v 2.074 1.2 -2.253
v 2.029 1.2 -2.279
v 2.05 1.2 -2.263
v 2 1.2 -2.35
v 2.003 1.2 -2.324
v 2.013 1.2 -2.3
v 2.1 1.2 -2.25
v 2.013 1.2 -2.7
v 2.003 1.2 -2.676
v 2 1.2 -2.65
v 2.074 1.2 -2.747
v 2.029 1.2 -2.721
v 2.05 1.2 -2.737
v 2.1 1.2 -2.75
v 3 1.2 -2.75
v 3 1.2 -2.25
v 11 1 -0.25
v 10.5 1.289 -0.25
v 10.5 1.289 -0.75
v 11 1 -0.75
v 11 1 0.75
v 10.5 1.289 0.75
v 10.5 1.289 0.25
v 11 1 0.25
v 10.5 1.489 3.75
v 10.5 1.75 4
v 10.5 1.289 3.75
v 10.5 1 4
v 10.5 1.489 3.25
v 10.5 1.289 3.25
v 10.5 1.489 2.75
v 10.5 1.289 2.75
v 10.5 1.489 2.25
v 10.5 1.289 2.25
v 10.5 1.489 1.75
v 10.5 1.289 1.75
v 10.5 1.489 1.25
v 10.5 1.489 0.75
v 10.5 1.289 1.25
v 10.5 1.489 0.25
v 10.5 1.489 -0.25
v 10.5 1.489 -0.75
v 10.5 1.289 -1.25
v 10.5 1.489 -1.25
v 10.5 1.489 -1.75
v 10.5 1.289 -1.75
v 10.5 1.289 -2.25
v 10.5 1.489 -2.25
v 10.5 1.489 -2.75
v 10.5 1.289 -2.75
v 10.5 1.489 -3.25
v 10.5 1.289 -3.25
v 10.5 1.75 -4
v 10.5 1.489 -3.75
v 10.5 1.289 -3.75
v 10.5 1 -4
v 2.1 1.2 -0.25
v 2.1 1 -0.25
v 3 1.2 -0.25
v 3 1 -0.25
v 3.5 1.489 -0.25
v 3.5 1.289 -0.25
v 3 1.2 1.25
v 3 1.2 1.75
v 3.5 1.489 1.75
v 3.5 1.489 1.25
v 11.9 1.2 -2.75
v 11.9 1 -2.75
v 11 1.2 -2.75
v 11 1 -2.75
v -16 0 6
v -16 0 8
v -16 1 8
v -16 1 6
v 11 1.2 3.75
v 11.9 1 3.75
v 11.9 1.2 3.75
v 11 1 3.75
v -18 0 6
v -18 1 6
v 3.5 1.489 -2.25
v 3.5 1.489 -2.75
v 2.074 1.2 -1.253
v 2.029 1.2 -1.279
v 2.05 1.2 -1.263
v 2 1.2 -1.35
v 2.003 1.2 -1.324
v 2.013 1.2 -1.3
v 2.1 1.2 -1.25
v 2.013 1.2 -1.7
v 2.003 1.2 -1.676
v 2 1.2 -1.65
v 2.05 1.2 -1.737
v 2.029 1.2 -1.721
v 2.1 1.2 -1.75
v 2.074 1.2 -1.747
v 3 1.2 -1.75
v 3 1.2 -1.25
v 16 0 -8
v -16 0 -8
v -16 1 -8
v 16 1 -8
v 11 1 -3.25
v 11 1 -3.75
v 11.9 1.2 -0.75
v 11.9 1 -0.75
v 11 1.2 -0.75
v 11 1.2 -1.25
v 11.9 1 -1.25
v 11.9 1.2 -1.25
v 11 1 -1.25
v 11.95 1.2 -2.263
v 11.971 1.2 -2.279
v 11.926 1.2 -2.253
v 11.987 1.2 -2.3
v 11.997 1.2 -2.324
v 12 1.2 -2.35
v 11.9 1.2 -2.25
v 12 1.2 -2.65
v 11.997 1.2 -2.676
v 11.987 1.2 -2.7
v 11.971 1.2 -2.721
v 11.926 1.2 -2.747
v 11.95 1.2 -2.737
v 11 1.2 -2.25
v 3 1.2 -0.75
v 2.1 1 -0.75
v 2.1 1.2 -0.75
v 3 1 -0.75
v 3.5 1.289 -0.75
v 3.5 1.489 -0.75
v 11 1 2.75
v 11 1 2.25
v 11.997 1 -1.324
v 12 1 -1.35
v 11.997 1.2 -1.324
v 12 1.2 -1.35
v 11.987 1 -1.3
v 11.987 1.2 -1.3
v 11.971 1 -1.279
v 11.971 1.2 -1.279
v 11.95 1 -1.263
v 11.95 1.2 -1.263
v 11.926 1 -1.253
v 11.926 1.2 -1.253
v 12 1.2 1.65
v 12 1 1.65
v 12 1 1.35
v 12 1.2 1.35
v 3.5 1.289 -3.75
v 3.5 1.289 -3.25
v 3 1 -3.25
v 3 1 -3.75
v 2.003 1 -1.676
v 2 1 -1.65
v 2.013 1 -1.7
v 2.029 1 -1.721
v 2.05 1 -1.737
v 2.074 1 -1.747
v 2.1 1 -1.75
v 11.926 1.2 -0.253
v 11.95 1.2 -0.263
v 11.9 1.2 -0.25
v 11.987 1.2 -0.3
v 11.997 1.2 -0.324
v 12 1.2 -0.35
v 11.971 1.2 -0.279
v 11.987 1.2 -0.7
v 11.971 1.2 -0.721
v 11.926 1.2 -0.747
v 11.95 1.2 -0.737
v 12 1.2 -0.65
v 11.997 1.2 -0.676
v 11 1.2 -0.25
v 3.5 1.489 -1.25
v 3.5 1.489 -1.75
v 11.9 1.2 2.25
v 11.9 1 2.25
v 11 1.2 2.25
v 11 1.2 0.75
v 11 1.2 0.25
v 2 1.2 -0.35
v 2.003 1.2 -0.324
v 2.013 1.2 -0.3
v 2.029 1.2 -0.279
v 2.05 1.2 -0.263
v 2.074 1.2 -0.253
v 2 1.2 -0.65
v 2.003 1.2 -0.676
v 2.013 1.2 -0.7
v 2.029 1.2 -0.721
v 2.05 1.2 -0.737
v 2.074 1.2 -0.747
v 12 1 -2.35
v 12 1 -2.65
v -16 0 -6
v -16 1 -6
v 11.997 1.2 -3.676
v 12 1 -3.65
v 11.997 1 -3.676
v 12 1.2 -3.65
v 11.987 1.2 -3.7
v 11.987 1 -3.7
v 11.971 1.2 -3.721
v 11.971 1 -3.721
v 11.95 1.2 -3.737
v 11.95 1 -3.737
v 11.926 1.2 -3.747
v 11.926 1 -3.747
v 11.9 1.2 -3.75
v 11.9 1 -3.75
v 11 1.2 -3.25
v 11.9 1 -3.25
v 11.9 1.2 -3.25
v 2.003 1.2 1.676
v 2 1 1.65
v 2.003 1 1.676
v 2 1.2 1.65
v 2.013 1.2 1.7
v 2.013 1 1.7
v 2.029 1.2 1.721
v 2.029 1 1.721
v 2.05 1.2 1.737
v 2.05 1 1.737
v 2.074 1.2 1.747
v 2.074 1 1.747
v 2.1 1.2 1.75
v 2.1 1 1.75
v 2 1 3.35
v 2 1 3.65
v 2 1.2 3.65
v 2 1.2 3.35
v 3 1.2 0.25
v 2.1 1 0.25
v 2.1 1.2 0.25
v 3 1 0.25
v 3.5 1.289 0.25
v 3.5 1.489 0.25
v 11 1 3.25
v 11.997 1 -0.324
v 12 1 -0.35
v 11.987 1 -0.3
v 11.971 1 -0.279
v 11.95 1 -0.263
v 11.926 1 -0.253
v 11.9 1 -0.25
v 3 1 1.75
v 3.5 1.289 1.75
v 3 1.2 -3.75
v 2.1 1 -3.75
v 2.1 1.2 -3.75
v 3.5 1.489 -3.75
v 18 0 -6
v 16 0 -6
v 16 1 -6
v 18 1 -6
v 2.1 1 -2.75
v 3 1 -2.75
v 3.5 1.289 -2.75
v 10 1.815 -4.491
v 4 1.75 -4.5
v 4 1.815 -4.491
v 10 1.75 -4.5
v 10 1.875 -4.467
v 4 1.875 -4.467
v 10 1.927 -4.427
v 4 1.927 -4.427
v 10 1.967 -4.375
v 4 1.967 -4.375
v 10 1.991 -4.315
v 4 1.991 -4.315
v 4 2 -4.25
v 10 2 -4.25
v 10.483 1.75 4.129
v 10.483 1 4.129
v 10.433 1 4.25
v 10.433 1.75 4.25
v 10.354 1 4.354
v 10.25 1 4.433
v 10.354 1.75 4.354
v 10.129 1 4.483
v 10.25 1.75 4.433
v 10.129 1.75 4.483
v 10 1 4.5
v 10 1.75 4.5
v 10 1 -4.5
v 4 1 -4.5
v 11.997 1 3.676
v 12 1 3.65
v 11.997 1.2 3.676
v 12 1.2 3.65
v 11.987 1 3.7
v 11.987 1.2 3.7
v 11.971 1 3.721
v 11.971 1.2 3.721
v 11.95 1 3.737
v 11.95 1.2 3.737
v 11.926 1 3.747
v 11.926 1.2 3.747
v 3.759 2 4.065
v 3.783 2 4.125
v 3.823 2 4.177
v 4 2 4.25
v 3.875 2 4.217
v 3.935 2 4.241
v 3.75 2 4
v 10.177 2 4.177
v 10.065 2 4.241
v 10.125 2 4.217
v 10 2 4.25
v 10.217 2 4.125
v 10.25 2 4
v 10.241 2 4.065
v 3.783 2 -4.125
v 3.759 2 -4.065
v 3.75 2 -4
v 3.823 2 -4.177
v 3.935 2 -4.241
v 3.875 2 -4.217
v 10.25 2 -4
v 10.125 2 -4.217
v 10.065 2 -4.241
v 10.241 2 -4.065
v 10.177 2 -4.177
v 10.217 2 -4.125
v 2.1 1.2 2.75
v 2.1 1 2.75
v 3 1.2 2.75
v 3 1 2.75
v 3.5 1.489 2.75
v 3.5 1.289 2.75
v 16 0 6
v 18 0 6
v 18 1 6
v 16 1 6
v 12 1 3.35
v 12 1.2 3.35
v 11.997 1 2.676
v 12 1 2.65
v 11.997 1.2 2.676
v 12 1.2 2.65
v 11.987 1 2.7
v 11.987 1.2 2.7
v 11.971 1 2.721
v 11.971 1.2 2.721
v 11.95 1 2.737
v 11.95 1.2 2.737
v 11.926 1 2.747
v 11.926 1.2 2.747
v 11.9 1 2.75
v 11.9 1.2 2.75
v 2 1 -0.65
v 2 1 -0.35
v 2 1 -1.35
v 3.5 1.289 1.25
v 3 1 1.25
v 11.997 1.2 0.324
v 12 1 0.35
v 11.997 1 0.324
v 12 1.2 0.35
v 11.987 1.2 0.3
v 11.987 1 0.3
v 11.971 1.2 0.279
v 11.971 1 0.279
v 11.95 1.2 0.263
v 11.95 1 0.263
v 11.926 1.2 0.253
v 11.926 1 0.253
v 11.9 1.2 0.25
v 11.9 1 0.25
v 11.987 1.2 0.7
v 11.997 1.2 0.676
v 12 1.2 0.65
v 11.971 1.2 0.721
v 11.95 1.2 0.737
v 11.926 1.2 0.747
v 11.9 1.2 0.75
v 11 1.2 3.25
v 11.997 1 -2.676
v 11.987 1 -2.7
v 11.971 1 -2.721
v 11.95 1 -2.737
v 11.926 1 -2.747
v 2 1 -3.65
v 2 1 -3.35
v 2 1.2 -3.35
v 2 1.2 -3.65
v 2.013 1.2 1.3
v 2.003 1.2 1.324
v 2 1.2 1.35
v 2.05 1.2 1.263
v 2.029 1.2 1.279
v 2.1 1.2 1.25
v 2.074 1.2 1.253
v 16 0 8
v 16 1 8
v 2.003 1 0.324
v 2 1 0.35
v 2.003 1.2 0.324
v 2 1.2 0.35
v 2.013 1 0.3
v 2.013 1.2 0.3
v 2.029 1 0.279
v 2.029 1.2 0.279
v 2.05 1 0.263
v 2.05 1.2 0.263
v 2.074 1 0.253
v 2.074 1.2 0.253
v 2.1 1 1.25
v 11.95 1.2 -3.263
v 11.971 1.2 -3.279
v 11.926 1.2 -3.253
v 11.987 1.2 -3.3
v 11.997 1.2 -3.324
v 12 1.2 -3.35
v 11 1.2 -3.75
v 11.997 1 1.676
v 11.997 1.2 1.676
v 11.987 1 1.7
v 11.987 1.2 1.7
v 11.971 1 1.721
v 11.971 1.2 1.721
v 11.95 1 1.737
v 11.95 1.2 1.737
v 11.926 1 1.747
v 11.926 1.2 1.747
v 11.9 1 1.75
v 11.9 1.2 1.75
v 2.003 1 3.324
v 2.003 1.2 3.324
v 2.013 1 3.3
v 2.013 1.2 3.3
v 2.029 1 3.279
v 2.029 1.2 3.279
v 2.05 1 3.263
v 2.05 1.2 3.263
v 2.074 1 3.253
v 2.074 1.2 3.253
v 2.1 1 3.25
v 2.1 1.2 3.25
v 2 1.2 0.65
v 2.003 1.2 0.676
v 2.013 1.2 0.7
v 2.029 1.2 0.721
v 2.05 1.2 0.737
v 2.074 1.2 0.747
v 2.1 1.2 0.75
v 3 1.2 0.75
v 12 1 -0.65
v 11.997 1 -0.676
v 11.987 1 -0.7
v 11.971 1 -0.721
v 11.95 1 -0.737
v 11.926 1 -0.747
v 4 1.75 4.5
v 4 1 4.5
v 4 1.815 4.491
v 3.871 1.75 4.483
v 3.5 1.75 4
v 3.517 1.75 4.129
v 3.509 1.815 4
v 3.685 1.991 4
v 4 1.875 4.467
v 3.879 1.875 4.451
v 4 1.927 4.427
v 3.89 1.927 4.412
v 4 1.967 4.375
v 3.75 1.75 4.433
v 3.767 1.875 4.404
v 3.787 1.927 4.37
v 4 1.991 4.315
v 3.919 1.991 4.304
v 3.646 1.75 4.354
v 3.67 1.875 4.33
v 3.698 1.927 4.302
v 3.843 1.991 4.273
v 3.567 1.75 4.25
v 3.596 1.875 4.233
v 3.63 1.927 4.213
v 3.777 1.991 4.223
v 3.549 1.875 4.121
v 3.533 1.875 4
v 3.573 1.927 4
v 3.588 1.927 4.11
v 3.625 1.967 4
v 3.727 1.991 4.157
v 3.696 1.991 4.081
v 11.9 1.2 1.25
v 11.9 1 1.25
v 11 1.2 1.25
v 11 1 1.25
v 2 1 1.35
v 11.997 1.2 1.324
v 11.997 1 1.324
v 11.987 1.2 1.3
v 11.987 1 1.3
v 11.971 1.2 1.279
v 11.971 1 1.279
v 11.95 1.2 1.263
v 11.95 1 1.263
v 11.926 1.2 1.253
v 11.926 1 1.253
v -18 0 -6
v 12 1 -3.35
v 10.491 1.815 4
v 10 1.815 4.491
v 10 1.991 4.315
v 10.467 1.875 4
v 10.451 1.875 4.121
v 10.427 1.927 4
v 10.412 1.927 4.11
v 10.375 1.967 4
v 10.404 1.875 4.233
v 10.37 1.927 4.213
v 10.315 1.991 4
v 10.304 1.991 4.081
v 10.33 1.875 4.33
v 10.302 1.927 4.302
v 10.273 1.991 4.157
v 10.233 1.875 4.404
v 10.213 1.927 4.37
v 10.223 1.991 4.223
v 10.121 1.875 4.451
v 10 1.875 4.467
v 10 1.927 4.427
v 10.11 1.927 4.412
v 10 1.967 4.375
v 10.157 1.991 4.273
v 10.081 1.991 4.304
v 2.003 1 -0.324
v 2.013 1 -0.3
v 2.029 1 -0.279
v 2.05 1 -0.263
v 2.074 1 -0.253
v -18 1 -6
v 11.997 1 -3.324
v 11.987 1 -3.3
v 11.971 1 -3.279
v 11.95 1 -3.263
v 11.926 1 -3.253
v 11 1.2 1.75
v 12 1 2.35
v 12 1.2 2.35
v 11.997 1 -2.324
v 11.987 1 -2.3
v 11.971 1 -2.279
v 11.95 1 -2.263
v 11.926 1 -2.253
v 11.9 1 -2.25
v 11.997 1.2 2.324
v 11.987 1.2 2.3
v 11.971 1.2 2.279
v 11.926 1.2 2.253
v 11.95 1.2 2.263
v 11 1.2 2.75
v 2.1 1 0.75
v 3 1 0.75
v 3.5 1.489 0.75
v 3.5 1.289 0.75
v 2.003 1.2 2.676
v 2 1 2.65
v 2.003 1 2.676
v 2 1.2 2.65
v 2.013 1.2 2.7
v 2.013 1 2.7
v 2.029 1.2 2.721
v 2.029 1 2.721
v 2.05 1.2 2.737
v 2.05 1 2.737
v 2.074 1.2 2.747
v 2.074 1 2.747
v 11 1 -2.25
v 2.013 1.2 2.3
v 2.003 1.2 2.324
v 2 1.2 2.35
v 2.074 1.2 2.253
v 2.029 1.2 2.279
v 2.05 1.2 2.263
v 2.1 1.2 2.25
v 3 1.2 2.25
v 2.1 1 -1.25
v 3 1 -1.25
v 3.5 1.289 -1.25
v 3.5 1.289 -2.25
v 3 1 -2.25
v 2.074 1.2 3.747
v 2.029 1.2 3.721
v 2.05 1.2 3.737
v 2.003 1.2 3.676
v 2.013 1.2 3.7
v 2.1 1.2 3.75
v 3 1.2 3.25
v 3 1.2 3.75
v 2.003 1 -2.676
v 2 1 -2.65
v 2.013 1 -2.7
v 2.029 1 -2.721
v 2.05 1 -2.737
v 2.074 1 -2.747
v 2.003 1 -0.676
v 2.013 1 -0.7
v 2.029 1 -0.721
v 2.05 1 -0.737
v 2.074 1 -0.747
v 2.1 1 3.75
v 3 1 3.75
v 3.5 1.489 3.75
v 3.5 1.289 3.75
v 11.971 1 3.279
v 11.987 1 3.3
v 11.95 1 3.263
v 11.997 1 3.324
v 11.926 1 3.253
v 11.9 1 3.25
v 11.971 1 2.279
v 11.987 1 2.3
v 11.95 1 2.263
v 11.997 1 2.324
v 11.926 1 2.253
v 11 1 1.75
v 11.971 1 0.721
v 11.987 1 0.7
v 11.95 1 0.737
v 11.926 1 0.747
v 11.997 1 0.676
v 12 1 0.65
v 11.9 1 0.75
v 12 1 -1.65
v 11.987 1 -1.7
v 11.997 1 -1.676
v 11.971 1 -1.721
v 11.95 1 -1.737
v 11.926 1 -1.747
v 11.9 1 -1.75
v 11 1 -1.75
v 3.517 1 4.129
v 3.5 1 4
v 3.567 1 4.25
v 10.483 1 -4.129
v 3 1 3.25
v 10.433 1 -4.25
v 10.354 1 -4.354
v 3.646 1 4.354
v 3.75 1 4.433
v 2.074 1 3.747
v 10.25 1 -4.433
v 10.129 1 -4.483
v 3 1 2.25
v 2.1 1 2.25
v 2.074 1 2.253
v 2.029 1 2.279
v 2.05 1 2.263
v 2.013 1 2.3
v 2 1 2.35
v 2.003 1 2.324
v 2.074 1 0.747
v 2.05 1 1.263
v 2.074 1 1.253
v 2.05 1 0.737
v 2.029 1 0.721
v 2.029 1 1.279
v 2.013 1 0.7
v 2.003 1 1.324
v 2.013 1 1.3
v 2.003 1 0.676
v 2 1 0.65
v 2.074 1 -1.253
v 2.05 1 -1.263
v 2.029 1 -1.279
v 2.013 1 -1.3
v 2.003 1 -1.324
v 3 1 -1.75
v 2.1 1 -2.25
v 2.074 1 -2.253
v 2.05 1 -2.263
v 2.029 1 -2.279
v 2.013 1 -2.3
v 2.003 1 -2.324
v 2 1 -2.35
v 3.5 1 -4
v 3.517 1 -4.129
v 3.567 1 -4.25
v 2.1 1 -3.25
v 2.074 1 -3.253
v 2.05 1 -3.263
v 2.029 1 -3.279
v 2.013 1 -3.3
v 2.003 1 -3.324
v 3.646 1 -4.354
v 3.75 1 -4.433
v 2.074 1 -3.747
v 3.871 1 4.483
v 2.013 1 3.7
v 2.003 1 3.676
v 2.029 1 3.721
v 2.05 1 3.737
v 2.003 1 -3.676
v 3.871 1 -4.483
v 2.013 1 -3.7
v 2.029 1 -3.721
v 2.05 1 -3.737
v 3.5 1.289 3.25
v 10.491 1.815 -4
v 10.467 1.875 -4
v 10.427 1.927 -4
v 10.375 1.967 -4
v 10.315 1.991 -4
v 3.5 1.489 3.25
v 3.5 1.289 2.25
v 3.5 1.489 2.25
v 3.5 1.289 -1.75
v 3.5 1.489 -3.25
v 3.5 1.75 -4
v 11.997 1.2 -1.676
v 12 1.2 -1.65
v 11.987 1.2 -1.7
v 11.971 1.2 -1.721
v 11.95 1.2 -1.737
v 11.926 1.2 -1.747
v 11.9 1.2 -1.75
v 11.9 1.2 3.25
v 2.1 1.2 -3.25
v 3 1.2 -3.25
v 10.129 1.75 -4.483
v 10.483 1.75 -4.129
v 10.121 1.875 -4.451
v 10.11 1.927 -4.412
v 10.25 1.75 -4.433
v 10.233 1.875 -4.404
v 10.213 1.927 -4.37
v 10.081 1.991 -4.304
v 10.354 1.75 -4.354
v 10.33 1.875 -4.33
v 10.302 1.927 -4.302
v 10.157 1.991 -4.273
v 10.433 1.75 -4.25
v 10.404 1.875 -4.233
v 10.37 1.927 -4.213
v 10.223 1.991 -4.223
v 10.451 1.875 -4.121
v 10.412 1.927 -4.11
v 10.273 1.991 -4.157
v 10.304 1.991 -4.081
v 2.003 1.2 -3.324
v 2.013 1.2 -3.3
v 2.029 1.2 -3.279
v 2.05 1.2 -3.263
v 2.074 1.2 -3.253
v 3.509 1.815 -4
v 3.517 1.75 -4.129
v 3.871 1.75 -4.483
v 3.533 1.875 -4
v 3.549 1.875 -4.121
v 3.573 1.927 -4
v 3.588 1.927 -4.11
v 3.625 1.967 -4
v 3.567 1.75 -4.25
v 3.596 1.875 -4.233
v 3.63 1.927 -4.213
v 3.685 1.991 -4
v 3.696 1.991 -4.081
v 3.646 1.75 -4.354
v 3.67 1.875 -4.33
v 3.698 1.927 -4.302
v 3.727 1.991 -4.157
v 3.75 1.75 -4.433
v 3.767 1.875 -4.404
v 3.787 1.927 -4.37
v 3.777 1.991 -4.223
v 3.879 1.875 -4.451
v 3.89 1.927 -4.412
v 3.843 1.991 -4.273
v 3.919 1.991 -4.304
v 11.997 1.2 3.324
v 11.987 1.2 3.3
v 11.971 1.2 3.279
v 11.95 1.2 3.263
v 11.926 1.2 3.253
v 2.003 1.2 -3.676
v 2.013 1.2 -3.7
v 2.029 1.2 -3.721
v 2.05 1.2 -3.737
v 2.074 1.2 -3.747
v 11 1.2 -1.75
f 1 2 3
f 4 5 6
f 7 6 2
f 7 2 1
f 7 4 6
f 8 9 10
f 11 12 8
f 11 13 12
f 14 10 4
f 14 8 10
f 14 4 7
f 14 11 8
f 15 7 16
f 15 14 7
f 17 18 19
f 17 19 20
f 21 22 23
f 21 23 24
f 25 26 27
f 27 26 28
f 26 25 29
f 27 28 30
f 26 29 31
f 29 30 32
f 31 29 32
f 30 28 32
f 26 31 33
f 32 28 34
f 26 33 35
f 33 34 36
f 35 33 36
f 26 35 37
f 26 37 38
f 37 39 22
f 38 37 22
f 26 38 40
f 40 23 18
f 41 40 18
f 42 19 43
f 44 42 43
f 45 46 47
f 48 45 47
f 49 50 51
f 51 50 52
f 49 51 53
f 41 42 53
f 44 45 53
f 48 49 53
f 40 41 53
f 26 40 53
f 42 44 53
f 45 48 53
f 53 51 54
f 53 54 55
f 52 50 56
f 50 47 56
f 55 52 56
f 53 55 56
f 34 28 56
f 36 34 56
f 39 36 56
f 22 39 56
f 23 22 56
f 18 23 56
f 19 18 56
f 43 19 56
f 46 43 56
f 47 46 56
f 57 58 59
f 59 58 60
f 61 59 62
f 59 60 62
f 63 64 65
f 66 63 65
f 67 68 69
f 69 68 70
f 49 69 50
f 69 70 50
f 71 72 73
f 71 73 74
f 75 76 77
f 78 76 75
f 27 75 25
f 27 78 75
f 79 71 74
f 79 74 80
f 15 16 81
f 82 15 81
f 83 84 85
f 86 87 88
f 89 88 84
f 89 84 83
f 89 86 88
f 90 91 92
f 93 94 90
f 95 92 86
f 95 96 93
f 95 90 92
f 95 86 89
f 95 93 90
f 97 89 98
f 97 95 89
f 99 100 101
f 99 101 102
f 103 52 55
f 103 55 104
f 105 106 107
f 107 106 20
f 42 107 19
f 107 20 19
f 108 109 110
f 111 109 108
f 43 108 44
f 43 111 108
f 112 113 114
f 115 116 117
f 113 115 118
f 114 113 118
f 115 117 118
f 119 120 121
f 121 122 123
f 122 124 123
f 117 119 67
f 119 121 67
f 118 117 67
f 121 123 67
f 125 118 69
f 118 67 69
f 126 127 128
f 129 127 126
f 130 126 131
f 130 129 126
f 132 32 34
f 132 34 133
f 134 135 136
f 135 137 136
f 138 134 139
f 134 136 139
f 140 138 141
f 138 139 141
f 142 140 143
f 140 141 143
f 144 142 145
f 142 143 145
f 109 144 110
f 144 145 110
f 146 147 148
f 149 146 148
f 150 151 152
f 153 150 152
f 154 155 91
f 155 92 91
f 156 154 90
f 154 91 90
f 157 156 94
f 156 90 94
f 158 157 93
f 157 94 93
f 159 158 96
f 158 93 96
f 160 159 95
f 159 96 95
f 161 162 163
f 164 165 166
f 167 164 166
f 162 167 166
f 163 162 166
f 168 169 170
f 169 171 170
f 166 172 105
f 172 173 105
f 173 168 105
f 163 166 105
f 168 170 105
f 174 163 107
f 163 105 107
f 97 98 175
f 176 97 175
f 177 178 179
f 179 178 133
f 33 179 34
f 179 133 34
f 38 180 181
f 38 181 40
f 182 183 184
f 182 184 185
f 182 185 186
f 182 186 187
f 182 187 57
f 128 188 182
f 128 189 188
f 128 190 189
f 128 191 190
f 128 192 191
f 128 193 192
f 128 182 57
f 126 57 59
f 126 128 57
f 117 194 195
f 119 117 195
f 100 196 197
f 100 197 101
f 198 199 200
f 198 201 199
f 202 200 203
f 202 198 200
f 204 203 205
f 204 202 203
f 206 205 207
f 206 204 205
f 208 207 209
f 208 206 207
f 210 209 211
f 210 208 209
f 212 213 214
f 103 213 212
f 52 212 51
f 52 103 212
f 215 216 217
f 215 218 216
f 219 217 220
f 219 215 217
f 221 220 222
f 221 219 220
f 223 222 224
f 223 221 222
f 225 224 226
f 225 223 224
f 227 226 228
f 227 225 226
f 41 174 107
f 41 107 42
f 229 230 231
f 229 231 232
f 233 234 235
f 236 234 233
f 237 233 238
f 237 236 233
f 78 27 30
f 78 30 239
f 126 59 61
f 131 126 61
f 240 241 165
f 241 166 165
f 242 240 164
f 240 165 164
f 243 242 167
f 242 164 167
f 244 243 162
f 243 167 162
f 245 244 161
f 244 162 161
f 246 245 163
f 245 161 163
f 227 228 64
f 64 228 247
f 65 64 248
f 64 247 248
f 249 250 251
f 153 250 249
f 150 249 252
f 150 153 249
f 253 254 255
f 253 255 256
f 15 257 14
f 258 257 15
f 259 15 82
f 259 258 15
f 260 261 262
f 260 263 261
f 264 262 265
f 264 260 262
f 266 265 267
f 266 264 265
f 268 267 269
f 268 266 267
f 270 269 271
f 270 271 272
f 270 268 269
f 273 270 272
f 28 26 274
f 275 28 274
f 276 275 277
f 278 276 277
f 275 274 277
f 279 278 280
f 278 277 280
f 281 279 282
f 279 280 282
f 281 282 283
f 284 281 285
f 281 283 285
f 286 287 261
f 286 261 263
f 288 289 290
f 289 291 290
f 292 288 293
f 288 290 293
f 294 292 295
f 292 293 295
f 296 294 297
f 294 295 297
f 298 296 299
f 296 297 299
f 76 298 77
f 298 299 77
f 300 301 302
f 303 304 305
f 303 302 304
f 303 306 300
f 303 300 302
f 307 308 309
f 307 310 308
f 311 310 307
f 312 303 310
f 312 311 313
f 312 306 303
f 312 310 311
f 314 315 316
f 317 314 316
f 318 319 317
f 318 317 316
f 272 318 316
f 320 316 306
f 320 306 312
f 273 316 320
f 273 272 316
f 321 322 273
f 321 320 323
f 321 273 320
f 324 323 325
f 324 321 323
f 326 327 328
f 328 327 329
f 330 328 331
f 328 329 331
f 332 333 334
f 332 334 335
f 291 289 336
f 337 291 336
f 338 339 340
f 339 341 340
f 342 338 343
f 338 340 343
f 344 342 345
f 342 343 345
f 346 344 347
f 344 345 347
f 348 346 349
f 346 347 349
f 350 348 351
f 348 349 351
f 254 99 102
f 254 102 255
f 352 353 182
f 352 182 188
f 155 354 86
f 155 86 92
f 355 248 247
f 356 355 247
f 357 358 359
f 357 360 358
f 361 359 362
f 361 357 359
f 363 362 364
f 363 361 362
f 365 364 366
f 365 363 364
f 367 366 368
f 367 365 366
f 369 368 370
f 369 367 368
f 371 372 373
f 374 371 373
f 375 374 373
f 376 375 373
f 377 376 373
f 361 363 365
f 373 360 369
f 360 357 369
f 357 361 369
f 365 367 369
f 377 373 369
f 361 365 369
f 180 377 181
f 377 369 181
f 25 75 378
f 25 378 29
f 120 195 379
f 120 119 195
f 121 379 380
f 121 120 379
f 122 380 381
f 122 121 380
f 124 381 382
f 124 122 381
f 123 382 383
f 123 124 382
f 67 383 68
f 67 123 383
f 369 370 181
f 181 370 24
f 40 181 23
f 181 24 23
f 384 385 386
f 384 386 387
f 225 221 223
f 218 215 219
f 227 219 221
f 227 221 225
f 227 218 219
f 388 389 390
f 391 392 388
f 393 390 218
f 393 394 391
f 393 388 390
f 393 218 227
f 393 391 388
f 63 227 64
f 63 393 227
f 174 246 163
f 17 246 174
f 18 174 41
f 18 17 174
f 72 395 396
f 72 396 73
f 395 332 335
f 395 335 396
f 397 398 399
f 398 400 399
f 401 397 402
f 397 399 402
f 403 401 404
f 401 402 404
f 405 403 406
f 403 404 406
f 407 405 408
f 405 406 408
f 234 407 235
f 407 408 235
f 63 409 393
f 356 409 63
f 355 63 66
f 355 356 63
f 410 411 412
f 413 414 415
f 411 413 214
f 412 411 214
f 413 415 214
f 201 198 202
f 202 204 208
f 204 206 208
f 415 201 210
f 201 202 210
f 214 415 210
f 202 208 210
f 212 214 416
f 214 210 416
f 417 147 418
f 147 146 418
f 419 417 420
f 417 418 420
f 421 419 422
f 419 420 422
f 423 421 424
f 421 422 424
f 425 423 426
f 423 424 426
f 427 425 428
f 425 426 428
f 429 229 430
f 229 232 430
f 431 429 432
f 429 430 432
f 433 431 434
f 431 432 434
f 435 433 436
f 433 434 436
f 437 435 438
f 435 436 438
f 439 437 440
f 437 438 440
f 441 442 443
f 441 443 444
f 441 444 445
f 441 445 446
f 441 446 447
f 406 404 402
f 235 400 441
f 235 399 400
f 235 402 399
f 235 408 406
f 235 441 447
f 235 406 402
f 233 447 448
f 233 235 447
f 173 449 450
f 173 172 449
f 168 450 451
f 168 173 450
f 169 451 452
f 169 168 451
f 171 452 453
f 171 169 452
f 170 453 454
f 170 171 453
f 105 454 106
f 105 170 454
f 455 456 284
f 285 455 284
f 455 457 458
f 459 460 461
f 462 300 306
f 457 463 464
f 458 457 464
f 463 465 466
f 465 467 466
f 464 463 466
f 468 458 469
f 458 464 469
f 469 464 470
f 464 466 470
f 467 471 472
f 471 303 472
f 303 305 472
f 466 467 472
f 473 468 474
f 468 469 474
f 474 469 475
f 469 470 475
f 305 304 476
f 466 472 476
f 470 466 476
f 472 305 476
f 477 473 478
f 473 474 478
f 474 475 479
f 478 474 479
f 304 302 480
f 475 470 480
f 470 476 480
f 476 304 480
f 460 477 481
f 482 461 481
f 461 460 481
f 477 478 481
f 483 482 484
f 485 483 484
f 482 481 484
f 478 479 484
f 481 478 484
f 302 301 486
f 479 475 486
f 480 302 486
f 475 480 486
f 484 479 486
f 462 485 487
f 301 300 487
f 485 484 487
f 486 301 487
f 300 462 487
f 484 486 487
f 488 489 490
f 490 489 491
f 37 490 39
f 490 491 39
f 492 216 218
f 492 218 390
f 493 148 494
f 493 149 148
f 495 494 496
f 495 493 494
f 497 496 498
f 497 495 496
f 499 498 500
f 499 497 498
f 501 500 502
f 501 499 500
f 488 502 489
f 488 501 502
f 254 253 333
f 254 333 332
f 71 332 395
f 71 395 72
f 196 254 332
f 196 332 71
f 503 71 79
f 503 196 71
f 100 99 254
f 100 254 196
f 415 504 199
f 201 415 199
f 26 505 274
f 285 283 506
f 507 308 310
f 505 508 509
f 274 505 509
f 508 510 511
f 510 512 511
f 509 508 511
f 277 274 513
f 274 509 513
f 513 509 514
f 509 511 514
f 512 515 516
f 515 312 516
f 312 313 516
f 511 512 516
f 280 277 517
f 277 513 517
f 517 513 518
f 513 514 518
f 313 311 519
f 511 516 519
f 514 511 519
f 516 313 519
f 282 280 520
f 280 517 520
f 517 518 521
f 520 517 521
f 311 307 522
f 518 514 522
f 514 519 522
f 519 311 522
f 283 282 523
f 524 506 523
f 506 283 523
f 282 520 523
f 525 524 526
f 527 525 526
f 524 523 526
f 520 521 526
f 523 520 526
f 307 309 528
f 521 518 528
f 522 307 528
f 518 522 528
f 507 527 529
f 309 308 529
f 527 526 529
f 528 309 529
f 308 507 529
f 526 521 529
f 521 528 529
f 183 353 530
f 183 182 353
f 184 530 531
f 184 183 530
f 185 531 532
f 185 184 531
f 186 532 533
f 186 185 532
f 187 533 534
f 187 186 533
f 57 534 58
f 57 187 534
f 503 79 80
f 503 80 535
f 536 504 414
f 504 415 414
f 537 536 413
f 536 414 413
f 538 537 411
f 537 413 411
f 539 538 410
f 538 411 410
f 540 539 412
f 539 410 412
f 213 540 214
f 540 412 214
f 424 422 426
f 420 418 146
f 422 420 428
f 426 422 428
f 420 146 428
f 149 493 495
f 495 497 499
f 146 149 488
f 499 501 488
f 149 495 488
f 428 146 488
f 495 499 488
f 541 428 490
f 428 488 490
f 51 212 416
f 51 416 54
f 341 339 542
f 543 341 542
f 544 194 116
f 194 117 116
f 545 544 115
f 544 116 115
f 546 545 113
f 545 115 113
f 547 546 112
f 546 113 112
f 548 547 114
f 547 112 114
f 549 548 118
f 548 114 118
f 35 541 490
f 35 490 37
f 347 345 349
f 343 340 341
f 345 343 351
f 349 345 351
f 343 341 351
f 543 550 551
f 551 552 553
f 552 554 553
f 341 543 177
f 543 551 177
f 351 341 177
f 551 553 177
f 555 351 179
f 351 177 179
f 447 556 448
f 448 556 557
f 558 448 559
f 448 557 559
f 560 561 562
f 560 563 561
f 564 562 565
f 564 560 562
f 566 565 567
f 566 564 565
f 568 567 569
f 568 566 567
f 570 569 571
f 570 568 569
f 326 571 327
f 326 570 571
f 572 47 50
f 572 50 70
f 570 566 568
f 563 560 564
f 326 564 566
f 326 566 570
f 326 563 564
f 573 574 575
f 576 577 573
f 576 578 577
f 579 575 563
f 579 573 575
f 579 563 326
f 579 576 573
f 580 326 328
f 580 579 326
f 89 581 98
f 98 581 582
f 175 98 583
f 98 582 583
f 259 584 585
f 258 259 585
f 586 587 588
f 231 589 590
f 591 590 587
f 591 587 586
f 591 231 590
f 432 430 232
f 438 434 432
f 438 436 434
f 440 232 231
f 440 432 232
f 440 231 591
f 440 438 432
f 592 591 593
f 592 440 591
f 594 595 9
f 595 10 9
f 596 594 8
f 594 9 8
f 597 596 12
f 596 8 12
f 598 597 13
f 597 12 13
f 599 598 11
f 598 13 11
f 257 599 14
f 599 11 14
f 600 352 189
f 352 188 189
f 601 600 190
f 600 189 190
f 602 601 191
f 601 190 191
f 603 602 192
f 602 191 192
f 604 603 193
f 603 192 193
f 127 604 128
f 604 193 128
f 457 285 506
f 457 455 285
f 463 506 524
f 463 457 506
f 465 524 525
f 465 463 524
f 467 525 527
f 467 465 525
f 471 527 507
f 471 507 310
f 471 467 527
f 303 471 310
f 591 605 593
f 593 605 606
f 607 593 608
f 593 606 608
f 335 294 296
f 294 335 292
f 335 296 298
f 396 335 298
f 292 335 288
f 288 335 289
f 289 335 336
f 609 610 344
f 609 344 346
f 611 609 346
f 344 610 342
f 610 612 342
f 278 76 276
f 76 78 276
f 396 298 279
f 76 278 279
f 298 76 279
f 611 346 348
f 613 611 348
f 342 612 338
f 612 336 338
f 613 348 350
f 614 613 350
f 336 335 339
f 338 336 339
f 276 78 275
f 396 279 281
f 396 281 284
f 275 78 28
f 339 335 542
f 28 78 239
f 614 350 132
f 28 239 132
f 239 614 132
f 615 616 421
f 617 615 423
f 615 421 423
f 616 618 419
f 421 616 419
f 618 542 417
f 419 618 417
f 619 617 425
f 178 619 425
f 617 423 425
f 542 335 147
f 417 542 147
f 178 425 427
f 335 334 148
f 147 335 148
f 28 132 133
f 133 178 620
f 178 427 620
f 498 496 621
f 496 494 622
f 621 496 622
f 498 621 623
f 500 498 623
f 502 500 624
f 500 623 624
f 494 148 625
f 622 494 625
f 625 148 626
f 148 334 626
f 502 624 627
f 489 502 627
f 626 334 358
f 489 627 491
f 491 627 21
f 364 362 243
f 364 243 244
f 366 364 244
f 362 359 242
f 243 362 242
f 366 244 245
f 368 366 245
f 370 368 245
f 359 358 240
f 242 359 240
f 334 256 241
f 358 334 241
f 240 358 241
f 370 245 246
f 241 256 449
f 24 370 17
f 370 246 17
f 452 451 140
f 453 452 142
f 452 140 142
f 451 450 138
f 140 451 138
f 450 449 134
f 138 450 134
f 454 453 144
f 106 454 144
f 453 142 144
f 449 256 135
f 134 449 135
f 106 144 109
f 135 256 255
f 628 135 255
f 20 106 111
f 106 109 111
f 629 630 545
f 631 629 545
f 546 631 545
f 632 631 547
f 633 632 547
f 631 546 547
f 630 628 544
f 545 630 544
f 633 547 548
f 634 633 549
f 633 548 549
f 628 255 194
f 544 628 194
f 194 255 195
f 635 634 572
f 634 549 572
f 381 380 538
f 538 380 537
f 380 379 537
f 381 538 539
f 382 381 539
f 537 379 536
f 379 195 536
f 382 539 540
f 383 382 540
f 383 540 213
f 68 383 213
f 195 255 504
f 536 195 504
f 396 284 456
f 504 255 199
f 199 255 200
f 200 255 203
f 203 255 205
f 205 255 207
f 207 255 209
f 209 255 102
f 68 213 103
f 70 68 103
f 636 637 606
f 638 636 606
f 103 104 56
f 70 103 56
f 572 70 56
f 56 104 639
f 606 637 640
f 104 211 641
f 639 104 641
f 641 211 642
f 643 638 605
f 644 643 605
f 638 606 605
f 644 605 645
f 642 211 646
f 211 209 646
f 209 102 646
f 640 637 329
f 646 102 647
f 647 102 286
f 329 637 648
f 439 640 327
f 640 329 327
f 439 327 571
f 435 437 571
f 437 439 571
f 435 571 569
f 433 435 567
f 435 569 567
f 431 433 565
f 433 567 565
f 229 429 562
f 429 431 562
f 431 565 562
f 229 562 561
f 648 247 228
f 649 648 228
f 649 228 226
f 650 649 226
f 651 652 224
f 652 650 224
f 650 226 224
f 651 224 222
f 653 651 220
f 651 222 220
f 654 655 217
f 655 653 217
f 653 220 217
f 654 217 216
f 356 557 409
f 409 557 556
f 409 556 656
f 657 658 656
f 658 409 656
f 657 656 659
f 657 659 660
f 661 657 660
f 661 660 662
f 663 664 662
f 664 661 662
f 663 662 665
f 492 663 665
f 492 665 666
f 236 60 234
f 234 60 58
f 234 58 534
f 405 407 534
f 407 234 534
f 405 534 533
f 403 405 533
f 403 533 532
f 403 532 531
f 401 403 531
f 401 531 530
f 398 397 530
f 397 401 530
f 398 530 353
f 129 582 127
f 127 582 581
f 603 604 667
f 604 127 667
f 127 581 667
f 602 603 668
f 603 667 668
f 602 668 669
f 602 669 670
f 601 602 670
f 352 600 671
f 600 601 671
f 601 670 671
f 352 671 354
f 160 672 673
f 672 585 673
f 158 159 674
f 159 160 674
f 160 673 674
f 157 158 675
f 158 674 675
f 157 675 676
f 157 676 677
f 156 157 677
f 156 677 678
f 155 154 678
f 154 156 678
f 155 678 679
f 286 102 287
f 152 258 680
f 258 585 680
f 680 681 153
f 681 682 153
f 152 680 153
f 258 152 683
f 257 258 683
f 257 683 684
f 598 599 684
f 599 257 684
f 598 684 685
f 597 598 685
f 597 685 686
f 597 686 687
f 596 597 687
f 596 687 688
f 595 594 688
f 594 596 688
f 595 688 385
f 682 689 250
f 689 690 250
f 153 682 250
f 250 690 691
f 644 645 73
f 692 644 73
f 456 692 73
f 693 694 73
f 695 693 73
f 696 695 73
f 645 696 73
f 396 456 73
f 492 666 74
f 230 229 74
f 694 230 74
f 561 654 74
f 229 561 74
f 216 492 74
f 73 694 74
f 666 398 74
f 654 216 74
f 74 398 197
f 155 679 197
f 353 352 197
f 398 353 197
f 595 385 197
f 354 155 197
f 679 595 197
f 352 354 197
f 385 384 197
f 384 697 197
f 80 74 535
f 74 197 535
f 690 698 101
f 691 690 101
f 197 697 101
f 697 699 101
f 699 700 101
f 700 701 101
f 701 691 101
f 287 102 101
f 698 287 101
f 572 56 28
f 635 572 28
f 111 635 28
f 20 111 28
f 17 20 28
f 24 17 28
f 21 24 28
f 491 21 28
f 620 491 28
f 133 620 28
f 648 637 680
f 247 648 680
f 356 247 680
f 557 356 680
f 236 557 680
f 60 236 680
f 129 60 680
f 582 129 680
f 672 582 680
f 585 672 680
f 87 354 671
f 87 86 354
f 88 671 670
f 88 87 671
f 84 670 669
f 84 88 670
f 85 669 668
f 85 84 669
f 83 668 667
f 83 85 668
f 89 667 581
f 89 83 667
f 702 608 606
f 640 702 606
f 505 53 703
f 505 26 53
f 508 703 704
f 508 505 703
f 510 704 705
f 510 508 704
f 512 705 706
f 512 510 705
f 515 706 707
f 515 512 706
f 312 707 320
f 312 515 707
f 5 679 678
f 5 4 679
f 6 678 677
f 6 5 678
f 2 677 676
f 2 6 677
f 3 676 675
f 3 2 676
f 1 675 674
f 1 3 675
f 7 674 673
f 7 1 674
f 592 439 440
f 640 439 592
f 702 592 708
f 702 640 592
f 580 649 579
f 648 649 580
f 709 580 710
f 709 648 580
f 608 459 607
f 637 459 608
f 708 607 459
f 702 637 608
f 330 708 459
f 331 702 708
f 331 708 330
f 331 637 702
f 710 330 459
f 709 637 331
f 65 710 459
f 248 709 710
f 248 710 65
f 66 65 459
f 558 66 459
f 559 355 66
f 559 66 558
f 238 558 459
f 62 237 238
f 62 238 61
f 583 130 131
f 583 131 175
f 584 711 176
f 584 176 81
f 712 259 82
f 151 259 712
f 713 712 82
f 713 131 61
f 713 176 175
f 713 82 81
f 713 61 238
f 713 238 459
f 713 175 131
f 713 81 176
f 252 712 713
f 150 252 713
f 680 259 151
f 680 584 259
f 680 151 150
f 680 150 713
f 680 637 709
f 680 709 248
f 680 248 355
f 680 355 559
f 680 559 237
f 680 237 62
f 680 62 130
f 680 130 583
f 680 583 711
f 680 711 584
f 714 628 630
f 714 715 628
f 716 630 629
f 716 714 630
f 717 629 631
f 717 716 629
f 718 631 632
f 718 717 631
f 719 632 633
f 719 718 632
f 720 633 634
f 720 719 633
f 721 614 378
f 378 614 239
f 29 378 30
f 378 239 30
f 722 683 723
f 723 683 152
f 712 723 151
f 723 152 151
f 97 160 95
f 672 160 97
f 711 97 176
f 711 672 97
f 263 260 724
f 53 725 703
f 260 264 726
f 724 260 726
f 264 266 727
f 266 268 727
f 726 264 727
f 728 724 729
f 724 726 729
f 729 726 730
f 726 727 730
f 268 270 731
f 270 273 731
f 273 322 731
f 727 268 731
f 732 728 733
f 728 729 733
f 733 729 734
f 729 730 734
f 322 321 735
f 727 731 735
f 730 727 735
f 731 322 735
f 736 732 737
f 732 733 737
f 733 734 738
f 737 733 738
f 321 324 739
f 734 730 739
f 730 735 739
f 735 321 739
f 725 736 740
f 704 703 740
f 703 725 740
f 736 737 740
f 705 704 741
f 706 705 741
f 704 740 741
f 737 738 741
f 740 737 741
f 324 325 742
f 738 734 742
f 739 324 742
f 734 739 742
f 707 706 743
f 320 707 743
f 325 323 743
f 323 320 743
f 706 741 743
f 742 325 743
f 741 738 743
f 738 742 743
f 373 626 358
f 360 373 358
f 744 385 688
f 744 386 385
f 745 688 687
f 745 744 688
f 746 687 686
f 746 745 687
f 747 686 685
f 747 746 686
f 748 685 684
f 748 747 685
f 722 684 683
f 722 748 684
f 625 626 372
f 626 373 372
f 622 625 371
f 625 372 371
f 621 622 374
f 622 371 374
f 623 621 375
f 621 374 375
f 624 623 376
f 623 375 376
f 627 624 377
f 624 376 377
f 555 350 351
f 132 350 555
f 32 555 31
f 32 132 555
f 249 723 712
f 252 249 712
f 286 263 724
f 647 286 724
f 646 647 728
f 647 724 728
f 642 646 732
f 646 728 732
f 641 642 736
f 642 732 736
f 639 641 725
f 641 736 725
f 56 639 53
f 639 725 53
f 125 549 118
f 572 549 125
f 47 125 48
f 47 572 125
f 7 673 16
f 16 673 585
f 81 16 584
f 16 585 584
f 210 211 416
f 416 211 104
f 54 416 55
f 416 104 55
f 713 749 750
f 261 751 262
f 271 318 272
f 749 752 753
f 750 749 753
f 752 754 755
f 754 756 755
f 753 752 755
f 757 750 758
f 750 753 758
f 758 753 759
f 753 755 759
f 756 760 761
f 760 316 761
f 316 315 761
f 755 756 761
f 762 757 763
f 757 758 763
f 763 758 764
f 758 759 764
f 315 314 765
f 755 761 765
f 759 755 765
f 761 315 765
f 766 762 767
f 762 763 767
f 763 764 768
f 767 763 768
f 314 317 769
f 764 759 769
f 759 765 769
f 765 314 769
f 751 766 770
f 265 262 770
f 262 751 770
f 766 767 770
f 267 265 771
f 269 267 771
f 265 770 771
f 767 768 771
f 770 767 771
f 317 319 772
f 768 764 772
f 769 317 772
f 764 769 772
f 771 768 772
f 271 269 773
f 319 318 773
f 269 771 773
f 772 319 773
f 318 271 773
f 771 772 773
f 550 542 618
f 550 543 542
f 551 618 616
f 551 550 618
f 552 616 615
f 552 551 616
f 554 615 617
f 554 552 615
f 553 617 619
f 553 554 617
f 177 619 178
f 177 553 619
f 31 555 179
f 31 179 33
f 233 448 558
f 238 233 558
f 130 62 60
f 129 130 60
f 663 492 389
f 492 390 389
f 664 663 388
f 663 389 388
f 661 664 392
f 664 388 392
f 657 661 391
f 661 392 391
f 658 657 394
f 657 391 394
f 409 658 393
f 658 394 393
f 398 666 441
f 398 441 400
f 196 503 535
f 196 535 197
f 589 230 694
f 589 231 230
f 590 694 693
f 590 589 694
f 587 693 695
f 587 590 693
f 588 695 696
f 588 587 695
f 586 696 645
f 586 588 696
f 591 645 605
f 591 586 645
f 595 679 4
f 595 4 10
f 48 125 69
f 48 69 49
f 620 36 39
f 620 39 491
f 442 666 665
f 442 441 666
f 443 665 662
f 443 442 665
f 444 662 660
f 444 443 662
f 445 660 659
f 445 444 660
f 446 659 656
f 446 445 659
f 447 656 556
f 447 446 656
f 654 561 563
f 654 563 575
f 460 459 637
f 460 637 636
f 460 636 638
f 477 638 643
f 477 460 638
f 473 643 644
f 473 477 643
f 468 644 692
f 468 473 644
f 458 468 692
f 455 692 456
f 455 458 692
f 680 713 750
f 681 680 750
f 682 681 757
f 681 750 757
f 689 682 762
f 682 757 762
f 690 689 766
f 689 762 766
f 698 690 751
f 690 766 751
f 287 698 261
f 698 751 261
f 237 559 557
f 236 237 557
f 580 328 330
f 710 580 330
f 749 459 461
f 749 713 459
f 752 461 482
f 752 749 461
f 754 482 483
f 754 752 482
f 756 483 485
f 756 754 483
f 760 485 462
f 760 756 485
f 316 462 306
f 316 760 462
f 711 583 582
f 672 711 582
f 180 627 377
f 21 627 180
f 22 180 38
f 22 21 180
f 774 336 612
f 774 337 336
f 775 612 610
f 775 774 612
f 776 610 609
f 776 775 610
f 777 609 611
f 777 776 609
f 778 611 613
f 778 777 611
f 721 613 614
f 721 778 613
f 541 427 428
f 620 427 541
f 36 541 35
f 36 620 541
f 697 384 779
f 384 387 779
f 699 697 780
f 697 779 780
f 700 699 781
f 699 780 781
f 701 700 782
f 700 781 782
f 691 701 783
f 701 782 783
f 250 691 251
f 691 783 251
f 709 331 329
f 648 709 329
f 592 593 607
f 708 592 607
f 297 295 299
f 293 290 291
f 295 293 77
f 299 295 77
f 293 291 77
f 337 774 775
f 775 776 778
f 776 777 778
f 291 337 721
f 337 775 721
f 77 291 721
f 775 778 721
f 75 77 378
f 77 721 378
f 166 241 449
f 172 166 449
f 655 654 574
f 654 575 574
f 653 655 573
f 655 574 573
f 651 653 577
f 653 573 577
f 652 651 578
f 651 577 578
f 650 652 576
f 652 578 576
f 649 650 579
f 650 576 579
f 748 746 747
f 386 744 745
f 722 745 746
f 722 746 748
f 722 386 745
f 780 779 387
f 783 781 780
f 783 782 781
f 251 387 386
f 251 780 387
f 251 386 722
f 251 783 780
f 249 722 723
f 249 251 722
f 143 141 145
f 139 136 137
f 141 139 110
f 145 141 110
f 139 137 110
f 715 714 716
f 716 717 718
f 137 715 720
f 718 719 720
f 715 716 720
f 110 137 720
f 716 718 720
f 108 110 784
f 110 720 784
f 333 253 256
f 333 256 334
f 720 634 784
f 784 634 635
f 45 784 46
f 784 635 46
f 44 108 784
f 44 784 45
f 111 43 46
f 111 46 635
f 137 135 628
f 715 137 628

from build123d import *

# Parameters (mm, degrees)
ESTRUSIONE_ESTRUSIONE1_DEPTH = 1
SCHIZZO2_W                   = 7
SCHIZZO2_H                   = 9
ESTRUSIONE_ESTRUSIONE2_DEPTH = 1
RACCORDO2_R                  = 0.5
RACCORDO3_R                  = 0.25
SCHIZZO4_W                   = 1
SCHIZZO4_H                   = 8
ESTRUSIONE_ESTRUSIONE6_DEPTH = 0.2
ESTRUSIONE_ESTRUSIONE7_DEPTH = 8
SCHIZZO6_W                   = 1.5
SCHIZZO6_H                   = 0.5
SCHIZZO6_H_2                 = 0.25
TAGLIO_ESTRUSIONE1_DEPTH     = 1
RACCORDO6_R                  = 0.1
RACCORDO6_OF_SPECCHIA1_R     = 0.1


with BuildPart() as part:
    # Schizzo1 → Estrusione-Estrusione1 (new body)
    with BuildSketch(Plane(origin=(0, 0, 0), x_dir=(1, 0, 0), z_dir=(0, 1, 0))):
        Polygon((-16, -8), (-16, -6), (-18, -6), (-18, 6), (-16, 6), (-16, 8), (16, 8), (16, 6), (18, 6), (18, -6), (16, -6), (16, -8), align=None)
    extrude(amount=ESTRUSIONE_ESTRUSIONE1_DEPTH)

    # Schizzo2 → Estrusione-Estrusione2 (add)
    with BuildSketch(Plane(origin=(0, 1, 0), x_dir=(1, 0, 0), z_dir=(0, 1, 0))):
        with Locations((7, 0)):
            Rectangle(SCHIZZO2_W, SCHIZZO2_H)
    extrude(amount=ESTRUSIONE_ESTRUSIONE2_DEPTH)

    # Raccordo2
    raccordo2_edges = [part.edges().sort_by_distance(p)[0] for p in [
        (10.5, 1.5, 4.5),
        (10.5, 1.5, -4.5),
        (3.5, 1.5, -4.5),
        (3.5, 1.5, 4.5),
    ]]
    fillet(raccordo2_edges, radius=RACCORDO2_R)

    # Raccordo3
    raccordo3_edges = [part.edges().sort_by_distance(p)[0] for p in [
        (3.5, 2, 0),
        (7, 2, -4.5),
        (10.5, 2, 0),
        (7, 2, 4.5),
        (3.646446609, 2, 4.353553391),
        (10.353553391, 2, 4.353553391),
        (10.353553391, 2, -4.353553391),
        (3.646446609, 2, -4.353553391),
    ]]
    fillet(raccordo3_edges, radius=RACCORDO3_R)

    # Schizzo4 → Estrusione-Estrusione6 (add)
    with BuildSketch(Plane(origin=(0, 1, 0), x_dir=(1, 0, 0), z_dir=(0, 1, 0))):
        with Locations((2.5, 0)):
            Rectangle(SCHIZZO4_W, SCHIZZO4_H)
    estrusione_estrusione6 = extrude(amount=ESTRUSIONE_ESTRUSIONE6_DEPTH)

    # Schizzo5 → Estrusione-Estrusione7 (add)
    with BuildSketch(Plane.XY.offset(4)):
        Polygon((3, 1), (3, 1.2), (3.5, 1.488675135), (3.5, 1.288675135), align=None)
    estrusione_estrusione7 = extrude(amount=-ESTRUSIONE_ESTRUSIONE7_DEPTH)

    # Schizzo6 → Taglio-Estrusione1 (cut)
    with BuildSketch(Plane(origin=(0, 1, 0), x_dir=(1, 0, 0), z_dir=(0, 1, 0))):
        with Locations((2.75, -3)):
            Rectangle(SCHIZZO6_W, SCHIZZO6_H)
        with Locations((2.75, -2)):
            Rectangle(SCHIZZO6_W, SCHIZZO6_H)
        with Locations((2.75, -1)):
            Rectangle(SCHIZZO6_W, SCHIZZO6_H)
        with Locations((2.75, 0)):
            Rectangle(SCHIZZO6_W, SCHIZZO6_H)
        with Locations((2.75, 1)):
            Rectangle(SCHIZZO6_W, SCHIZZO6_H)
        with Locations((2.75, 2)):
            Rectangle(SCHIZZO6_W, SCHIZZO6_H)
        with Locations((2.75, 3)):
            Rectangle(SCHIZZO6_W, SCHIZZO6_H)
        with Locations((2.75, 3.875)):
            Rectangle(SCHIZZO6_W, SCHIZZO6_H_2)
        with Locations((2.75, -3.875)):
            Rectangle(SCHIZZO6_W, SCHIZZO6_H_2)
    taglio_estrusione1 = extrude(amount=TAGLIO_ESTRUSIONE1_DEPTH, mode=Mode.SUBTRACT)

    # Raccordo6
    raccordo6_edges = [part.edges().sort_by_distance(p)[0] for p in [
        (2, 1.1, 1.75),
        (2, 1.1, 2.25),
        (2, 1.1, 0.75),
        (2, 1.1, 1.25),
        (2, 1.1, -0.25),
        (2, 1.1, 0.25),
        (2, 1.1, -1.25),
        (2, 1.1, -0.75),
        (2, 1.1, 3.75),
        (2, 1.1, -3.75),
        (2, 1.1, -3.25),
        (2, 1.1, -2.75),
        (2, 1.1, -2.25),
        (2, 1.1, -1.75),
        (2, 1.1, 2.75),
        (2, 1.1, 3.25),
    ]]
    fillet(raccordo6_edges, radius=RACCORDO6_R)

    # Specchia1: Estrusione-Estrusione6, Estrusione-Estrusione7, Taglio-Estrusione1 across plane
    add(estrusione_estrusione6.mirror(Plane.ZY.offset(-7)))
    add(estrusione_estrusione7.mirror(Plane.ZY.offset(-7)))
    add(taglio_estrusione1.mirror(Plane.ZY.offset(-7)), mode=Mode.SUBTRACT)

    # Raccordo6 of Specchia1
    raccordo6_of_specchia1_edges = [part.edges().sort_by_distance(p)[0] for p in [
        (12, 1.1, 1.75),
        (12, 1.1, 2.25),
        (12, 1.1, 0.75),
        (12, 1.1, 1.25),
        (12, 1.1, -0.25),
        (12, 1.1, 0.25),
        (12, 1.1, -1.25),
        (12, 1.1, -0.75),
        (12, 1.1, 3.75),
        (12, 1.1, -3.75),
        (12, 1.1, -3.25),
        (12, 1.1, -2.75),
        (12, 1.1, -2.25),
        (12, 1.1, -1.75),
        (12, 1.1, 2.75),
        (12, 1.1, 3.25),
    ]]
    fillet(raccordo6_of_specchia1_edges, radius=RACCORDO6_OF_SPECCHIA1_R)


solid = part.part
